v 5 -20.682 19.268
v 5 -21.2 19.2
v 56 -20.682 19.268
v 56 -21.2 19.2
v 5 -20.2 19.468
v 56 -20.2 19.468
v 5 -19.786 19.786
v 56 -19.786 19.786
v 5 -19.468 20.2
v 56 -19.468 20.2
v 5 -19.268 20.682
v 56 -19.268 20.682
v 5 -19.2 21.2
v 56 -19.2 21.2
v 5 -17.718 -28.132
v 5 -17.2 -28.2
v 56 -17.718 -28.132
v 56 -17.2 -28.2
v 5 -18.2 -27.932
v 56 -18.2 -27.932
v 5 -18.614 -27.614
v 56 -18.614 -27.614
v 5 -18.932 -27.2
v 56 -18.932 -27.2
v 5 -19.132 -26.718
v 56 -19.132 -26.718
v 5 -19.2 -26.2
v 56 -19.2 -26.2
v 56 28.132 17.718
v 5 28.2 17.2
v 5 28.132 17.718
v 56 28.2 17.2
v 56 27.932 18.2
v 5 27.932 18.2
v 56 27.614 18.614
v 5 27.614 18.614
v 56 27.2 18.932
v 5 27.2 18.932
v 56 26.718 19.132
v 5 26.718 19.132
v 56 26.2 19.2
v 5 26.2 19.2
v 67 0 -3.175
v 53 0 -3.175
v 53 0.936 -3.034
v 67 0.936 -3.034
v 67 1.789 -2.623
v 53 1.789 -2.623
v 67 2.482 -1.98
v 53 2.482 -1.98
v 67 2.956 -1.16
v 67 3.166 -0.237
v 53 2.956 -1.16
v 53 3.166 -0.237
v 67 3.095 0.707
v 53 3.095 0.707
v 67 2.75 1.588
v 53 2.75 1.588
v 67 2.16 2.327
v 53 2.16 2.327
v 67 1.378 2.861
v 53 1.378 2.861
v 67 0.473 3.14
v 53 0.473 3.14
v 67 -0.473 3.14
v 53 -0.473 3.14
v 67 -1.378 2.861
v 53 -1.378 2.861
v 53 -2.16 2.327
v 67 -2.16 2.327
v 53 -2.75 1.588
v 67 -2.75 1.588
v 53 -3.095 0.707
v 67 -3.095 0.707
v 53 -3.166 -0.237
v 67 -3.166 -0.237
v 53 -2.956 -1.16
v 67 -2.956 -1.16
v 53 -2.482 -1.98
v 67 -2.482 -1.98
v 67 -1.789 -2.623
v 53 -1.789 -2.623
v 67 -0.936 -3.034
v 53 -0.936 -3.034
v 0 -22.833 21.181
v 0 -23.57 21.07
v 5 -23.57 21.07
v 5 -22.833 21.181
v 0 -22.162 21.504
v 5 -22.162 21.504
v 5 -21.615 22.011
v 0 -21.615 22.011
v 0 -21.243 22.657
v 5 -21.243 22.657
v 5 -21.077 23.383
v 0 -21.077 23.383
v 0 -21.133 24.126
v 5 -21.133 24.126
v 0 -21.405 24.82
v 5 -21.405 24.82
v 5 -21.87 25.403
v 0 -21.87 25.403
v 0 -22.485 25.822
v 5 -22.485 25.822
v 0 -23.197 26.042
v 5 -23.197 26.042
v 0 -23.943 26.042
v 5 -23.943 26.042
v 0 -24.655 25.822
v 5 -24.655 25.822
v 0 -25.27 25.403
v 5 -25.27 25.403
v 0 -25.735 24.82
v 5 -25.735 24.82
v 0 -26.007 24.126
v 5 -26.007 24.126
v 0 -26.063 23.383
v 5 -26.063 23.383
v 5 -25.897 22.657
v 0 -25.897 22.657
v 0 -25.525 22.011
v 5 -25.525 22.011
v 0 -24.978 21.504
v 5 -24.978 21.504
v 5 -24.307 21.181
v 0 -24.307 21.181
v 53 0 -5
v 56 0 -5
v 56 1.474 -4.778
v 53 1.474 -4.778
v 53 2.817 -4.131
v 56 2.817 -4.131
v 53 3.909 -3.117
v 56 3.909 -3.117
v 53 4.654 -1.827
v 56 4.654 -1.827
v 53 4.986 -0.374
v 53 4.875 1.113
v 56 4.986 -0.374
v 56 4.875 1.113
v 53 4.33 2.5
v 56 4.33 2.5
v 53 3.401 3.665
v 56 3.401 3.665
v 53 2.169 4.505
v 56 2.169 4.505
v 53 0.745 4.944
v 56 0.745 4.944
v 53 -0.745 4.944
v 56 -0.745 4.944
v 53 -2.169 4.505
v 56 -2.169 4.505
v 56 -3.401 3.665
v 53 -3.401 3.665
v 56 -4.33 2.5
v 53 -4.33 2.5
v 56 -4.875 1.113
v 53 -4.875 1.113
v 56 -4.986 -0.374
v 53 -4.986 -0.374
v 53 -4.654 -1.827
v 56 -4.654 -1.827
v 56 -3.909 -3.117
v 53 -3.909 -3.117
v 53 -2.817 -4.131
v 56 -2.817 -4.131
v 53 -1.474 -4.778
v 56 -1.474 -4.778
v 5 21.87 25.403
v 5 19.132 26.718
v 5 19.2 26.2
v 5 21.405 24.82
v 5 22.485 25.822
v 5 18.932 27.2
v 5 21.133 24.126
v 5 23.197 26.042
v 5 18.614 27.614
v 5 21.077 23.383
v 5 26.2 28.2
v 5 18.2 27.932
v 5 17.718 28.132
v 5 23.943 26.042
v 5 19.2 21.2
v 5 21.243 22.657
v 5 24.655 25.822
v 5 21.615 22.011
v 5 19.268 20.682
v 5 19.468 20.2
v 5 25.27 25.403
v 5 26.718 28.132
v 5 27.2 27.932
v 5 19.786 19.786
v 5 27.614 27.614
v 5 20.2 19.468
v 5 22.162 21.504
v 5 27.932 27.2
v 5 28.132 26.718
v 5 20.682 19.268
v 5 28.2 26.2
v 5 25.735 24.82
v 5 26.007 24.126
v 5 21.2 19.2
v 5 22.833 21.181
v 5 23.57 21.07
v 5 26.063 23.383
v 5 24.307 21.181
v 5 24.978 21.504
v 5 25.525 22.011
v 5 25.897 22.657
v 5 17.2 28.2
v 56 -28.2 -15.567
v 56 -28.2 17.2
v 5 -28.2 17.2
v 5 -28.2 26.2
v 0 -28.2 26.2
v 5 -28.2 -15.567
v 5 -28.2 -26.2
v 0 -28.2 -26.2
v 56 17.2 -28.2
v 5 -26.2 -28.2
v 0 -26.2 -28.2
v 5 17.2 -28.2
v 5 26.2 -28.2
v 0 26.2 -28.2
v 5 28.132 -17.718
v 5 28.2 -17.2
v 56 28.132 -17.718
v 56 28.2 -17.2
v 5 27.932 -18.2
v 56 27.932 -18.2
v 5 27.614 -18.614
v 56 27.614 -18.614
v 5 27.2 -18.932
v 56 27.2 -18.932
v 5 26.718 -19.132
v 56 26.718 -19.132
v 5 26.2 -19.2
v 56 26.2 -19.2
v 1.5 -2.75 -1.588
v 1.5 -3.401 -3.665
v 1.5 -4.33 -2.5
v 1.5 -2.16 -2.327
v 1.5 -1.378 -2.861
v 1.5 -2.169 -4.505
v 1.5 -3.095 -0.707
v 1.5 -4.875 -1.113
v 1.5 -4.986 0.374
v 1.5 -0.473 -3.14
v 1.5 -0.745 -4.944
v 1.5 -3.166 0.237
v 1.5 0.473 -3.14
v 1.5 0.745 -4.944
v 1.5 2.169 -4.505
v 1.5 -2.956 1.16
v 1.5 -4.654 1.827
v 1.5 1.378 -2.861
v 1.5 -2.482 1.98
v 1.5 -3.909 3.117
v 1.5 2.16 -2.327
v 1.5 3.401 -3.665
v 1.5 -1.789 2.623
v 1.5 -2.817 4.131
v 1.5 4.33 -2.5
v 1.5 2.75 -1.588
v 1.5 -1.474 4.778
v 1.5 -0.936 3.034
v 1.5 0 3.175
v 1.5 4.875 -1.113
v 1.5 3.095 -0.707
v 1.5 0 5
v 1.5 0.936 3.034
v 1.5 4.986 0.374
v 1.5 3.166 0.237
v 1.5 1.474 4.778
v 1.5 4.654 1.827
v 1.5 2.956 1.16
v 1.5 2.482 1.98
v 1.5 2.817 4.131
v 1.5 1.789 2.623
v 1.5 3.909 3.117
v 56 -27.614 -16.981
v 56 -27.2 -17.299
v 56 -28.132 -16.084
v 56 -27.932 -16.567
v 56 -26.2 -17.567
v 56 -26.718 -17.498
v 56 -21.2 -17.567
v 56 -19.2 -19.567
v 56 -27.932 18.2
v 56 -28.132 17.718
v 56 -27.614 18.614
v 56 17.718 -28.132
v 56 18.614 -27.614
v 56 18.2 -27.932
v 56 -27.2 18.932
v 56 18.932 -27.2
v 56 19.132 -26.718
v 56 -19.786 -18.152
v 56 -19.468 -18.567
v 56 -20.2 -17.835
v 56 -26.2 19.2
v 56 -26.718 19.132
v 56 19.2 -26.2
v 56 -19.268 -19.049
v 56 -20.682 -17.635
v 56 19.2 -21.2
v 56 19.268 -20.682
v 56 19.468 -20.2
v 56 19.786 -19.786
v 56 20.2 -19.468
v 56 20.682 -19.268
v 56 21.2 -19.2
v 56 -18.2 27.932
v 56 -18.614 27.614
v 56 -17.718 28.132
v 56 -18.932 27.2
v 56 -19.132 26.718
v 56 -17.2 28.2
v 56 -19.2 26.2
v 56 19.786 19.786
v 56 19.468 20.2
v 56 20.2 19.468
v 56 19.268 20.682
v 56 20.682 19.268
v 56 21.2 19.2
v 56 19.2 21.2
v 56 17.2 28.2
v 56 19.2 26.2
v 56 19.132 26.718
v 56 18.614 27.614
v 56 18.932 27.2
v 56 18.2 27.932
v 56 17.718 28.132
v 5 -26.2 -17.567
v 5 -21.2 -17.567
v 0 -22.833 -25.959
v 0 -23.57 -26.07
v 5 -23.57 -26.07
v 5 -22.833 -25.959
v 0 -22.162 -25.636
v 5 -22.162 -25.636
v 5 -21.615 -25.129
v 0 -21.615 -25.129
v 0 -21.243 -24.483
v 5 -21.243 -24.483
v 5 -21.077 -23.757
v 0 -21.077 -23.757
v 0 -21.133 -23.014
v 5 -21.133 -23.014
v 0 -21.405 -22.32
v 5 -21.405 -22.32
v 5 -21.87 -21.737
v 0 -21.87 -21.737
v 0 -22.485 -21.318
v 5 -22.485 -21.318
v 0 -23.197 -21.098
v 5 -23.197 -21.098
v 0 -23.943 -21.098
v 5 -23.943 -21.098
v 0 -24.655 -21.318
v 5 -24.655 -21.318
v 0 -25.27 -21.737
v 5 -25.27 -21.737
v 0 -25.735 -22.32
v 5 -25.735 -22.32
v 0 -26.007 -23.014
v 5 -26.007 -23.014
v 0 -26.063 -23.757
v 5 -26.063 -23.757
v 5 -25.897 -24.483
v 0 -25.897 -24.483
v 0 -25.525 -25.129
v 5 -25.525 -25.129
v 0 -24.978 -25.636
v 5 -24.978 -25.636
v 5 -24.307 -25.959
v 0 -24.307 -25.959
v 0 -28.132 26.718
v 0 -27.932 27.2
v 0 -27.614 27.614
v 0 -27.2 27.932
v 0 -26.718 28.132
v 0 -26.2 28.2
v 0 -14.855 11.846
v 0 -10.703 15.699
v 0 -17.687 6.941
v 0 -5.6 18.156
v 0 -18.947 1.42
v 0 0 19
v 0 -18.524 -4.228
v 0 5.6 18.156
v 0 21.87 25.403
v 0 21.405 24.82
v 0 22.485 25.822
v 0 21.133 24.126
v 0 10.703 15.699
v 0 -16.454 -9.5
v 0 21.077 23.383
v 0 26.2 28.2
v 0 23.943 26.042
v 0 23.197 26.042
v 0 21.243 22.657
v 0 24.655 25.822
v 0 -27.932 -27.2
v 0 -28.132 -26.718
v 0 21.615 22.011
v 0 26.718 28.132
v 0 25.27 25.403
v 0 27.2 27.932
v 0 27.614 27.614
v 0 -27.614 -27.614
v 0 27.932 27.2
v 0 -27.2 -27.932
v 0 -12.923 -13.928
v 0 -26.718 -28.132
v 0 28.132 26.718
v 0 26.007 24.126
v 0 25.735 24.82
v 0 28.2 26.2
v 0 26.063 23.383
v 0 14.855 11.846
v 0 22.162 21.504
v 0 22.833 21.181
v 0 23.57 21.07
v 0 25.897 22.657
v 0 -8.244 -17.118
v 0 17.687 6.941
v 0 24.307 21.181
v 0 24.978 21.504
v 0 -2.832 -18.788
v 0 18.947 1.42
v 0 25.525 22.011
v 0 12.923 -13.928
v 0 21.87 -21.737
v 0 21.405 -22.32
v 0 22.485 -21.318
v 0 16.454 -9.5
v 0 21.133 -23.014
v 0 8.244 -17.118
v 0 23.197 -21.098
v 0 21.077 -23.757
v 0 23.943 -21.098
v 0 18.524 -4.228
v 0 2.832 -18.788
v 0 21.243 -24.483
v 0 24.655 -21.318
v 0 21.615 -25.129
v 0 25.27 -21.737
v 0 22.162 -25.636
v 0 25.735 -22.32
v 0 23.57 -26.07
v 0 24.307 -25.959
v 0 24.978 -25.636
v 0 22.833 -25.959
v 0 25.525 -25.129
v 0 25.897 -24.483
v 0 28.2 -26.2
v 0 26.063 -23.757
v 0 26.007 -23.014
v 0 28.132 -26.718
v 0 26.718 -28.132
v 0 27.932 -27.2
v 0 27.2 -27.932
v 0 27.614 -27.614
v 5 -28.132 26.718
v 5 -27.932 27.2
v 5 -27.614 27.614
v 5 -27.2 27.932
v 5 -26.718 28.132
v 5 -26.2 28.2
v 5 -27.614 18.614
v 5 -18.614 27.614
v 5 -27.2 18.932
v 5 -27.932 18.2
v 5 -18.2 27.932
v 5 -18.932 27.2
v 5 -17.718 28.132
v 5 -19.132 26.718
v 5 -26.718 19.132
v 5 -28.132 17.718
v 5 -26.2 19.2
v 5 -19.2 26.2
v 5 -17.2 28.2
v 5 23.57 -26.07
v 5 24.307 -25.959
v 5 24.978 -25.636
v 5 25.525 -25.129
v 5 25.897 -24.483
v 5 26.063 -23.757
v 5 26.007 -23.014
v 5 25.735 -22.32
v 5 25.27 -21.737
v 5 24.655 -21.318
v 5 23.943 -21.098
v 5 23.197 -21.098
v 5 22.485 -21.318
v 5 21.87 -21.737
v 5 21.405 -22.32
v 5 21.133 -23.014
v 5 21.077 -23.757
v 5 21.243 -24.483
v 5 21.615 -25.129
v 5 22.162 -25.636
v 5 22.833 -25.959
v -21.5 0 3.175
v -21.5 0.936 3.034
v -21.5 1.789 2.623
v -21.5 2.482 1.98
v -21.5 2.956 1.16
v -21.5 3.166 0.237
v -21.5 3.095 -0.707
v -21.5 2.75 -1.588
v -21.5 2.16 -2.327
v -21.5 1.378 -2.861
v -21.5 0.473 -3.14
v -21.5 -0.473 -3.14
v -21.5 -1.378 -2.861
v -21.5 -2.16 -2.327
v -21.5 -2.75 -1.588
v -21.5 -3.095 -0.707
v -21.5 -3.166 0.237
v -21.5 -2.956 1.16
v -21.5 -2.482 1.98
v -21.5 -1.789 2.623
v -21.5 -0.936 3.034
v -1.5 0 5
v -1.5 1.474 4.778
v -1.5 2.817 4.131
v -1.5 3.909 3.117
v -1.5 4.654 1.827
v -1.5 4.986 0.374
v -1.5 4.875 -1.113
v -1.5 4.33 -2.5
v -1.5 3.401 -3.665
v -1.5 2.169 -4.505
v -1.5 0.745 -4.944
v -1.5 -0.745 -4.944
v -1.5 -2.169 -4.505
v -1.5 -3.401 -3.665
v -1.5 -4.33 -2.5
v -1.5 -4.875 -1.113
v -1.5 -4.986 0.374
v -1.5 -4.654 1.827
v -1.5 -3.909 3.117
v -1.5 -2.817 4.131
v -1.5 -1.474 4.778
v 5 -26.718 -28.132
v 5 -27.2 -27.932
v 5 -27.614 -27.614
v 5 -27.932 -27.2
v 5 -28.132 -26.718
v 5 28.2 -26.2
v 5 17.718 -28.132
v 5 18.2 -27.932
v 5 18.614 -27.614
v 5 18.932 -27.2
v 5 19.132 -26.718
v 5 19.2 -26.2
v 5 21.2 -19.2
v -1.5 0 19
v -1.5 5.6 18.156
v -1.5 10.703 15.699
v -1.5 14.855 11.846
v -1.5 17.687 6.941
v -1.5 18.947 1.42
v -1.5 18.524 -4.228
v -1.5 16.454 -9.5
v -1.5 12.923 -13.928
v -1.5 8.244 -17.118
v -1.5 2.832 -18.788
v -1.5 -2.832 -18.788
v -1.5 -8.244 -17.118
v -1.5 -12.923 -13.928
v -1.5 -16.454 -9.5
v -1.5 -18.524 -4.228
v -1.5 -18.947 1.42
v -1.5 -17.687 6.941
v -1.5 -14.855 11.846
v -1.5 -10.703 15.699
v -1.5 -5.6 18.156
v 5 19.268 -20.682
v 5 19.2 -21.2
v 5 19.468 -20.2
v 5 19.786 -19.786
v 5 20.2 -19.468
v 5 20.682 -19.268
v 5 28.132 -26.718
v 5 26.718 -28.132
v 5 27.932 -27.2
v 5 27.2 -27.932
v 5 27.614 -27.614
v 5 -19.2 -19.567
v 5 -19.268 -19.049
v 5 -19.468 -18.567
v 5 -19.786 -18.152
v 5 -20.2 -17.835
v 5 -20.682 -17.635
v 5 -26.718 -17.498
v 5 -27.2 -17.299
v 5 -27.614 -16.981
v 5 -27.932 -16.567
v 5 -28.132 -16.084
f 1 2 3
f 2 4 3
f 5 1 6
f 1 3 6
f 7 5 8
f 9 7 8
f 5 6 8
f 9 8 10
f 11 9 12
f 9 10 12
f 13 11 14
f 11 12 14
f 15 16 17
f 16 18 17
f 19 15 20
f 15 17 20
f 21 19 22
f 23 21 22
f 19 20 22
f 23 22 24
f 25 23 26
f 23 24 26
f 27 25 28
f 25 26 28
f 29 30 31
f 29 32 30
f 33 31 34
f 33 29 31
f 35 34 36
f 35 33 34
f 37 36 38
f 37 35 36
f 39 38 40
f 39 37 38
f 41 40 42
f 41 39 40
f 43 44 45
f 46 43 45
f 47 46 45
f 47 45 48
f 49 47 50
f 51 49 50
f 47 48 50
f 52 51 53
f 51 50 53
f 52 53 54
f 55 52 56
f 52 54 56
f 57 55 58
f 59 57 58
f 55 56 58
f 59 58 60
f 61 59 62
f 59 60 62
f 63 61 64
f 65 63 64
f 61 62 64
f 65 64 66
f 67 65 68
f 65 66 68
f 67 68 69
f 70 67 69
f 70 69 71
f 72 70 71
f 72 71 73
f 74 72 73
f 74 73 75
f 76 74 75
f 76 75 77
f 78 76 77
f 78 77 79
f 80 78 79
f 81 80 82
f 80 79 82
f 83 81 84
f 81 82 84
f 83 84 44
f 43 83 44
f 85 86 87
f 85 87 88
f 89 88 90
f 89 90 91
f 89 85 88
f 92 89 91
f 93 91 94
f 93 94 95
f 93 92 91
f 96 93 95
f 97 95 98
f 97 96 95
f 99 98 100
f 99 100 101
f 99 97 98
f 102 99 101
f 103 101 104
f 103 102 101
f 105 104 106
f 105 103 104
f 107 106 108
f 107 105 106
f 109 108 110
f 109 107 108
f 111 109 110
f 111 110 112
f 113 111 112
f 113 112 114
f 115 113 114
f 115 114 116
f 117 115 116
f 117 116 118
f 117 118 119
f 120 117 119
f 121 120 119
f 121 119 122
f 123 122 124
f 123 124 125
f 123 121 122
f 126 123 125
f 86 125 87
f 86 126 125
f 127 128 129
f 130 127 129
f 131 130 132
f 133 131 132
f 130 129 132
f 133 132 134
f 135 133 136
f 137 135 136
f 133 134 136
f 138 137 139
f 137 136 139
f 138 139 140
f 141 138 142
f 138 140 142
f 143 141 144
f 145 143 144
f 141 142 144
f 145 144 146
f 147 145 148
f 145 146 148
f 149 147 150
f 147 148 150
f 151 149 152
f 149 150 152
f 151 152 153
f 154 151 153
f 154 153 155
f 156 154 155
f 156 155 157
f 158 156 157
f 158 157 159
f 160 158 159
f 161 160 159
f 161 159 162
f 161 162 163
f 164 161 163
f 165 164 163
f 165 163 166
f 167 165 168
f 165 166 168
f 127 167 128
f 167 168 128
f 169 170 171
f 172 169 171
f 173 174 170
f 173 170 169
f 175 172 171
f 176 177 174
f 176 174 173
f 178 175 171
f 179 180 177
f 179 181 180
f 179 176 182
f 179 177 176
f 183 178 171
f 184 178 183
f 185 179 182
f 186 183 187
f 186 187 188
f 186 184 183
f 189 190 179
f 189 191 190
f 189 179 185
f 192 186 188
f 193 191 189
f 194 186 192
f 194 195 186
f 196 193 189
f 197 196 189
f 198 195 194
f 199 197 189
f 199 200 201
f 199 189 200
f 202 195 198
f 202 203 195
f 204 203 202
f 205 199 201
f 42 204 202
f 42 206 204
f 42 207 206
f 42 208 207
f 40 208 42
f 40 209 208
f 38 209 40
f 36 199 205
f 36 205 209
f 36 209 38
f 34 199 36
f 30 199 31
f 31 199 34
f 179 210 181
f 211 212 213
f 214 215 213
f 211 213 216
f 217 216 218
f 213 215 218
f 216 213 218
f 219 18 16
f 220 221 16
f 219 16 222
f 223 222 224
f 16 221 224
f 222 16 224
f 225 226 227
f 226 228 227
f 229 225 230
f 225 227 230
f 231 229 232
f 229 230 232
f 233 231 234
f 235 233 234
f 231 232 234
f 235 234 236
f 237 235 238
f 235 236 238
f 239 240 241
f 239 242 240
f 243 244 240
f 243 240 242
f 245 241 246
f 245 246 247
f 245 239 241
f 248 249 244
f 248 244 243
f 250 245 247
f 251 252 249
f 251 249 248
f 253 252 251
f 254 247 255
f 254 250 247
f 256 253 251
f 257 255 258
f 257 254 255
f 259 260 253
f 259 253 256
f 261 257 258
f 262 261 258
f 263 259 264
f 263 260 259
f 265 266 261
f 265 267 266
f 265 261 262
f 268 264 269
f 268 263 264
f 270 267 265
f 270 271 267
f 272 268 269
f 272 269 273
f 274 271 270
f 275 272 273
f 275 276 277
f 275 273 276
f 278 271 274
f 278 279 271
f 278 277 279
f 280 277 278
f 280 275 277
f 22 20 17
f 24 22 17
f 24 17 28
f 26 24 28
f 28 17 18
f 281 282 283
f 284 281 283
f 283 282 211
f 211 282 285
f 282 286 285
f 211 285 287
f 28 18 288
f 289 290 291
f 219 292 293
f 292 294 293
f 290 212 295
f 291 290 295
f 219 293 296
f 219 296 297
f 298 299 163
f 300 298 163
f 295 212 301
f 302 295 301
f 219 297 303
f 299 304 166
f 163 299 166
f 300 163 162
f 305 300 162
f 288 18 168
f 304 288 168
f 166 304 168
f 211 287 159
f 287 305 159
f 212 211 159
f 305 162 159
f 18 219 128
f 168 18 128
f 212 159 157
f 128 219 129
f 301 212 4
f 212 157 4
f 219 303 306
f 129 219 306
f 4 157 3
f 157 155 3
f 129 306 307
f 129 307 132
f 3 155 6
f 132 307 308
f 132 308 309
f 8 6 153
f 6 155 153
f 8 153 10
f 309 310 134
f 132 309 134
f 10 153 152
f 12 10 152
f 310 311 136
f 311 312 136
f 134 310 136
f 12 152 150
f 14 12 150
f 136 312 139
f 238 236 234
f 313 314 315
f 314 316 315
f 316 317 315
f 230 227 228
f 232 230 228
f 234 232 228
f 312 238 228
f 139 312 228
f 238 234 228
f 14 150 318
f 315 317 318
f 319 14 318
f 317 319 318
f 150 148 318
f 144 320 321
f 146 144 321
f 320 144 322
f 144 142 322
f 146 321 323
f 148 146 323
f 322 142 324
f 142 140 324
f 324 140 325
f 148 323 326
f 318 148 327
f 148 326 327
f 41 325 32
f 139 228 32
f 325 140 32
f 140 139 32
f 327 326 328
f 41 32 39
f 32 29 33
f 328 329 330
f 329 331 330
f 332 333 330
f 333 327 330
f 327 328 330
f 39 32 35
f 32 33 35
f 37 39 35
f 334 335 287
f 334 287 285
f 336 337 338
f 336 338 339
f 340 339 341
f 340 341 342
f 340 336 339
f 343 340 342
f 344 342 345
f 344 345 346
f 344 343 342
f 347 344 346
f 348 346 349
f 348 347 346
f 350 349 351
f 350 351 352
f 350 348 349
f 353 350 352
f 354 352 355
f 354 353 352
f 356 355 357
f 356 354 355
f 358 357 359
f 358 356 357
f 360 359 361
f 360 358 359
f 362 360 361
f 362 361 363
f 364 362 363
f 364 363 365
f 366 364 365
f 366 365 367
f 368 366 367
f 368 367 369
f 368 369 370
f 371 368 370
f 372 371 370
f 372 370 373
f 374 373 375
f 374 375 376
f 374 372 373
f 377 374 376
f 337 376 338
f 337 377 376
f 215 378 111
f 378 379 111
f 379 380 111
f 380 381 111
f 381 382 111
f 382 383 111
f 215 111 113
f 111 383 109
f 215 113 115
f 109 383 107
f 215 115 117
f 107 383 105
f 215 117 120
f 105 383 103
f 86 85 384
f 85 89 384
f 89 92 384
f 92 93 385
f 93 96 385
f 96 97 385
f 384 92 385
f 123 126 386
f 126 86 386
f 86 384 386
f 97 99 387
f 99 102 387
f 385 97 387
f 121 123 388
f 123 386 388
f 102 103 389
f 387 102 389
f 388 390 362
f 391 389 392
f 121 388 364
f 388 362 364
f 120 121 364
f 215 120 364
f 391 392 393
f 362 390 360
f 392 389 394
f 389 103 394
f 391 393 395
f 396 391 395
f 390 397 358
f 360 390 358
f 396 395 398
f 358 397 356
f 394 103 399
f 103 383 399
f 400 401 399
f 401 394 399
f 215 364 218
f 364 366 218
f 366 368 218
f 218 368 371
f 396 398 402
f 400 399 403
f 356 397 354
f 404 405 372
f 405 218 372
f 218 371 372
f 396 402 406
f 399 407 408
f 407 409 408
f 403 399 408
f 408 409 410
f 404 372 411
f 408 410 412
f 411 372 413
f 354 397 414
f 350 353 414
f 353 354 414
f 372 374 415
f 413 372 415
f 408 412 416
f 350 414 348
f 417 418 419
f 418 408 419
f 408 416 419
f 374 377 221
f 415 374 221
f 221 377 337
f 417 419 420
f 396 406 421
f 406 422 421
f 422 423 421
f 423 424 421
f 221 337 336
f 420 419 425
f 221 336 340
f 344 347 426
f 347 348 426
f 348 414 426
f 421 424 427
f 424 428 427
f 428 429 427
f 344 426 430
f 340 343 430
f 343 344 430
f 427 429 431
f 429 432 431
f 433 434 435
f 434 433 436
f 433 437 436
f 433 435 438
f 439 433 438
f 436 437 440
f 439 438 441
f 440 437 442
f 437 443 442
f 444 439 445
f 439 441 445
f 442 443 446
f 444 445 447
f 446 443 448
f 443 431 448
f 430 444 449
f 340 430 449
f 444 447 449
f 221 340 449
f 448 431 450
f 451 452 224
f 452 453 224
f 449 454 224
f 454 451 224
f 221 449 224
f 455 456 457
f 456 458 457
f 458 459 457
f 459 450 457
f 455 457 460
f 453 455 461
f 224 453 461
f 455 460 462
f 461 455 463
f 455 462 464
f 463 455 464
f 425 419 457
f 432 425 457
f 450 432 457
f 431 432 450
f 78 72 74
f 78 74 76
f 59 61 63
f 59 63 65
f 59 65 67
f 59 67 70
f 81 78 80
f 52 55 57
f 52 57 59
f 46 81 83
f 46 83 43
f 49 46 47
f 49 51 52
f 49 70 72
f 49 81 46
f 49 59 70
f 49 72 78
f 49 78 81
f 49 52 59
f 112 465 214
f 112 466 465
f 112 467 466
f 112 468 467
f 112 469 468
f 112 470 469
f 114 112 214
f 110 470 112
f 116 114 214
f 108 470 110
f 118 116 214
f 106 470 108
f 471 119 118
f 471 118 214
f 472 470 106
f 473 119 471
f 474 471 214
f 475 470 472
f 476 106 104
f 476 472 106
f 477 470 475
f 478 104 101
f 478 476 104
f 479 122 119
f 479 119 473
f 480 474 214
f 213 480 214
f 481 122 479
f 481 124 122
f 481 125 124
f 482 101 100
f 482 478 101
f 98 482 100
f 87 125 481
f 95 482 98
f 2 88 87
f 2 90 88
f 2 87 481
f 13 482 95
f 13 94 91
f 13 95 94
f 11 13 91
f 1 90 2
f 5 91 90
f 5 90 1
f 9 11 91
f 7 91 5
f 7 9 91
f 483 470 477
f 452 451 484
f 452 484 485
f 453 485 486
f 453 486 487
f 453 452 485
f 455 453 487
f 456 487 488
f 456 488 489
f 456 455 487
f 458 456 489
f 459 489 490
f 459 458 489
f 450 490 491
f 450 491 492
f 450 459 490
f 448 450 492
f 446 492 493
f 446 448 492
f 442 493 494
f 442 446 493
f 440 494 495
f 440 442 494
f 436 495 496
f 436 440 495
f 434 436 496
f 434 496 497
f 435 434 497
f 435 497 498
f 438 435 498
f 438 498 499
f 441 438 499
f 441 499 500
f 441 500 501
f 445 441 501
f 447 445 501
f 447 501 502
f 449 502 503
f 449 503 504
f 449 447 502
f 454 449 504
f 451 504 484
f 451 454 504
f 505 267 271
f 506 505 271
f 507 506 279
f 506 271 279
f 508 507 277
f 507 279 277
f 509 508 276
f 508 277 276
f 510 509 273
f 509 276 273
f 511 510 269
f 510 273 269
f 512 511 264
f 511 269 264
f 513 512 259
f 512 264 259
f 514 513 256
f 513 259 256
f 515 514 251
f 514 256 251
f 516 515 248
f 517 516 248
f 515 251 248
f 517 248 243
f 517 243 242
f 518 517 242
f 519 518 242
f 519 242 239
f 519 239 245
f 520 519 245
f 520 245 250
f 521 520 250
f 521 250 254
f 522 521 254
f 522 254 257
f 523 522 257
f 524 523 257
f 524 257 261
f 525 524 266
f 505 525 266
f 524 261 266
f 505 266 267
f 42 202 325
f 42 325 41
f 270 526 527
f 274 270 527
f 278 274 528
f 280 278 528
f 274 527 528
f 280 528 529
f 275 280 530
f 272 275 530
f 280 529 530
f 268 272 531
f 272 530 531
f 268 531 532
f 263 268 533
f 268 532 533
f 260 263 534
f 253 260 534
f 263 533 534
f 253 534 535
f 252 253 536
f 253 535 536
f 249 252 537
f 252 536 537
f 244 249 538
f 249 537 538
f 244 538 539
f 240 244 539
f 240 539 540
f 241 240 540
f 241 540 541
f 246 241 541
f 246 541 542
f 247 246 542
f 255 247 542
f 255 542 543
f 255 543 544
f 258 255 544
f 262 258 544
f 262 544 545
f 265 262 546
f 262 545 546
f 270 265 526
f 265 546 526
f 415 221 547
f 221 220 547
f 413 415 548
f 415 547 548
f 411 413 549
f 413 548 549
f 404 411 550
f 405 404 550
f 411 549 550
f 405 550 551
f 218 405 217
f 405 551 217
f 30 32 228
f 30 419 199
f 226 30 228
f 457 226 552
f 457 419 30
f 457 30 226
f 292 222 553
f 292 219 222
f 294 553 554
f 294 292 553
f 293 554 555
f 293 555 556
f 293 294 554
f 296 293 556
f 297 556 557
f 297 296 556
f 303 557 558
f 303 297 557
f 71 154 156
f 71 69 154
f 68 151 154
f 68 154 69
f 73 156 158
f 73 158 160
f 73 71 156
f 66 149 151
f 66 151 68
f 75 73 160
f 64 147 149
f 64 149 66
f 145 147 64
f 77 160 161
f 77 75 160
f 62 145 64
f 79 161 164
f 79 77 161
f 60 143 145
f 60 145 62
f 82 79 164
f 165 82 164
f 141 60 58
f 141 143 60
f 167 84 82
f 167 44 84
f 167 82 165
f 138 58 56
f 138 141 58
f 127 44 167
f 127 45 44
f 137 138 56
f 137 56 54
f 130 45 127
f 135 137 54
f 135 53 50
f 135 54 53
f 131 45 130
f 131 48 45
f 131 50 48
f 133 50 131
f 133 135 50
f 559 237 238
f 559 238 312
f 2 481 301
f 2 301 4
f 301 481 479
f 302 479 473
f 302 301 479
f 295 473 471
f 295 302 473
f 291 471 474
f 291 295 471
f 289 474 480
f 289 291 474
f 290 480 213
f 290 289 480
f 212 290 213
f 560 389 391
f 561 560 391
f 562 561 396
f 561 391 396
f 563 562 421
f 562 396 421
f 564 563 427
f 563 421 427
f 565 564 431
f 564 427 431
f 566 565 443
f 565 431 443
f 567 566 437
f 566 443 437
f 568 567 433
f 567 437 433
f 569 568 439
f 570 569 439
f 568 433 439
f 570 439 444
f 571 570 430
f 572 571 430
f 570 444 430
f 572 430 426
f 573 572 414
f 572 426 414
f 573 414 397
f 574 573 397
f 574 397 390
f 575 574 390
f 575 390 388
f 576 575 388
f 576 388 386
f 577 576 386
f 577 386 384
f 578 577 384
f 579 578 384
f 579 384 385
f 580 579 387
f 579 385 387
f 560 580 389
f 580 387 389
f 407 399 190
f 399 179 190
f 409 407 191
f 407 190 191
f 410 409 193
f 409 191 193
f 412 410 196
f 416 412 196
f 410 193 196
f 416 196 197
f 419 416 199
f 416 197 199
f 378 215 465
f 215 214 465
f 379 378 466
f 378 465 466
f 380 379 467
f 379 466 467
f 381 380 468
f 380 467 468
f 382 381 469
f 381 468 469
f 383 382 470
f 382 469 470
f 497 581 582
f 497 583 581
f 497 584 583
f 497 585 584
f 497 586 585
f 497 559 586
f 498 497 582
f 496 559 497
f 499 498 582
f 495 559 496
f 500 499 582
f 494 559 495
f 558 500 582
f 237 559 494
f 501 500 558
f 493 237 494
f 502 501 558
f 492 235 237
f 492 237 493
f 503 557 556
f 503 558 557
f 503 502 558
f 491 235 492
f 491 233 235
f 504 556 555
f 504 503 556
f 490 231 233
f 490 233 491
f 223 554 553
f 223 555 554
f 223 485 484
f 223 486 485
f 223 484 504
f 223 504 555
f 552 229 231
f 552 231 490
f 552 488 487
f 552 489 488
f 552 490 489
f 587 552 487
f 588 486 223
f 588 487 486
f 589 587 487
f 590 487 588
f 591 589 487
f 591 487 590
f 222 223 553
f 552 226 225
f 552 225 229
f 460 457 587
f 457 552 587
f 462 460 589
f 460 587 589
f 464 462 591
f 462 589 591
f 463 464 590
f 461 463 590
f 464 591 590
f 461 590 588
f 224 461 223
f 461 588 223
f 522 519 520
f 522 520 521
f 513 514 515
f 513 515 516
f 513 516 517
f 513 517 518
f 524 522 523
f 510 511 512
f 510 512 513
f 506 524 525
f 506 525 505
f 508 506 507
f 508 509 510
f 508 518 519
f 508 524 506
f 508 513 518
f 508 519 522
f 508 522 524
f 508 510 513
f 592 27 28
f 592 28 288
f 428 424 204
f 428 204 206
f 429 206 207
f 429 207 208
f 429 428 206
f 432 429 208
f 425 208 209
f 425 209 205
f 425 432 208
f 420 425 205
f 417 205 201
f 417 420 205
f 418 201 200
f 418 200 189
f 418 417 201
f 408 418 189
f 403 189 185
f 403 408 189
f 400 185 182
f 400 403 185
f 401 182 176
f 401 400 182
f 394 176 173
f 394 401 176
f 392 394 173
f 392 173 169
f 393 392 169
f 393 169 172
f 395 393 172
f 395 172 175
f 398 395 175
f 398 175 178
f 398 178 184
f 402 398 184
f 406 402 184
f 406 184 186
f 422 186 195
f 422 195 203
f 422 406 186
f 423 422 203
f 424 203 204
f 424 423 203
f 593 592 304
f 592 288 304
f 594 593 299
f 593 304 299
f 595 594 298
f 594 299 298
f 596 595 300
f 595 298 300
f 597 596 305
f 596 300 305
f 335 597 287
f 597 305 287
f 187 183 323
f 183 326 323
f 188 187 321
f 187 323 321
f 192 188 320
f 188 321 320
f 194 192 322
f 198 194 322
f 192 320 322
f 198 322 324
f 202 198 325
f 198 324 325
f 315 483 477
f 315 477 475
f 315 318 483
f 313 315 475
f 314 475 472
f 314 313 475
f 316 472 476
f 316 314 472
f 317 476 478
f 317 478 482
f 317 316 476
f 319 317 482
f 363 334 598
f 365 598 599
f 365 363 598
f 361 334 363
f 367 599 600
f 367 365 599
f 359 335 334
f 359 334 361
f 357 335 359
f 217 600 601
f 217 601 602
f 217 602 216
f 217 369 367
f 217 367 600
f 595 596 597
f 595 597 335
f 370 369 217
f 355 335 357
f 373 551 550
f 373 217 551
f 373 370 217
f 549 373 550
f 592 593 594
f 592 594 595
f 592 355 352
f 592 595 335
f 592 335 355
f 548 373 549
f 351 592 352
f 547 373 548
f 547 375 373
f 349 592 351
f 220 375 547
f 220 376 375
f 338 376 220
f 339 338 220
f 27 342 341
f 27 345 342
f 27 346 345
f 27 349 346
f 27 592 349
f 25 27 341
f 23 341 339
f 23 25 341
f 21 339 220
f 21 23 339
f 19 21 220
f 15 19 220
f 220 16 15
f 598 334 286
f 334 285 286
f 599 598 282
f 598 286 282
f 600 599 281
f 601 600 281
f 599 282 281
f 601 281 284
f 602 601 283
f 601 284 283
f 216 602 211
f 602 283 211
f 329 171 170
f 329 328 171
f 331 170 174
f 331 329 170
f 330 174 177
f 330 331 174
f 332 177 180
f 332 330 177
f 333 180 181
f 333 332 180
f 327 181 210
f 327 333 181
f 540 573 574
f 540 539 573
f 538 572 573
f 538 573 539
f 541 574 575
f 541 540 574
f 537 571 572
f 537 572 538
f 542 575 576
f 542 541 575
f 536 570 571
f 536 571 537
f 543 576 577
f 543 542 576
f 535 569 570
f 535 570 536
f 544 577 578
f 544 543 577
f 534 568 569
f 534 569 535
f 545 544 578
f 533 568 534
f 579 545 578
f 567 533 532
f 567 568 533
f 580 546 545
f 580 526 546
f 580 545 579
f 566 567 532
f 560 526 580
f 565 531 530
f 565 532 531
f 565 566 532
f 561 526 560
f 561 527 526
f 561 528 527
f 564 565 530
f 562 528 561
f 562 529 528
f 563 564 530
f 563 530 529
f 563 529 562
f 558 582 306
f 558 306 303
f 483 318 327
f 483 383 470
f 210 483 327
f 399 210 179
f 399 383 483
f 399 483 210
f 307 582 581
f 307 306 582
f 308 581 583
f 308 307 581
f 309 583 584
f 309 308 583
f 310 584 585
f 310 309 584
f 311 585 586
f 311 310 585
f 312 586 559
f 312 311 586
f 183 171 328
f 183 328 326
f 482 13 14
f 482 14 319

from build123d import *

# Parameters (mm, degrees)
SKETCH1_W           = 56.4
SKETCH1_H           = 56.4
SKETCH1_R           = 2.5
BOSS_EXTRUDE1_DEPTH = 5
BOSS_EXTRUDE2_DEPTH = 51
SKETCH3_R           = 5
CUT_EXTRUDE1_DEPTH  = 3
SKETCH5_R           = 3.175
BOSS_EXTRUDE3_DEPTH = 14
SKETCH6_R           = 19
BOSS_EXTRUDE4_DEPTH = 1.5
SKETCH7_R           = 5
CUT_EXTRUDE2_DEPTH  = 3
SKETCH9_R           = 3.175
BOSS_EXTRUDE5_DEPTH = 23
FILLET1_R           = 2
FILLET2_R           = 2
FILLET3_R           = 2
FILLET4_R           = 2
FILLET5_R           = 2
FILLET6_R           = 2
FILLET7_R           = 2
FILLET8_R           = 2
FILLET9_R           = 2
FILLET10_R          = 2
FILLET11_R          = 2
FILLET12_R          = 2
FILLET13_R          = 2
FILLET14_R          = 2
FILLET15_R          = 2
FILLET16_R          = 2


with BuildPart() as part:
    # Sketch1 → Boss-Extrude1 (new body)
    with BuildSketch(Plane(origin=(0, 0, 0), x_dir=(0, 0, -1), z_dir=(1, 0, 0))):
        Rectangle(SKETCH1_W, SKETCH1_H)
        with Locations((-23.57, 23.57)):
            Circle(SKETCH1_R, mode=Mode.SUBTRACT)
        with Locations((23.57, 23.57)):
            Circle(SKETCH1_R, mode=Mode.SUBTRACT)
        with Locations((23.57, -23.57)):
            Circle(SKETCH1_R, mode=Mode.SUBTRACT)
        with Locations((-23.57, -23.57)):
            Circle(SKETCH1_R, mode=Mode.SUBTRACT)
    extrude(amount=BOSS_EXTRUDE1_DEPTH)

    # Sketch2 → Boss-Extrude2 (add)
    with BuildSketch(Plane(origin=(5, 0, 0), x_dir=(0, 0, -1), z_dir=(1, 0, 0))):
        Polygon((-28.2, 19.2), (-19.2, 19.2), (-19.2, 28.2), (19.2, 28.2), (19.2, 19.2), (28.2, 19.2), (28.2, -19.2), (17.566571472, -19.2), (17.566571472, -28.2), (-19.2, -28.2), (-19.2, -19.2), (-28.2, -19.2), align=None)
    extrude(amount=BOSS_EXTRUDE2_DEPTH)

    # Sketch3 → Cut-Extrude1 (cut)
    with BuildSketch(Plane(origin=(56, 0, 0), x_dir=(0, 0, -1), z_dir=(1, 0, 0))):
        Circle(SKETCH3_R)
    extrude(amount=-CUT_EXTRUDE1_DEPTH, mode=Mode.SUBTRACT)

    # Sketch5 → Boss-Extrude3 (add)
    with BuildSketch(Plane(origin=(53, 0, 0), x_dir=(0, 0, -1), z_dir=(1, 0, 0))):
        Circle(SKETCH5_R)
    extrude(amount=BOSS_EXTRUDE3_DEPTH)

    # Sketch6 → Boss-Extrude4 (add)
    with BuildSketch(Plane.ZY):
        Circle(SKETCH6_R)
    extrude(amount=BOSS_EXTRUDE4_DEPTH)

    # Sketch7 → Cut-Extrude2 (cut)
    with BuildSketch(Plane.ZY.offset(1.5)):
        Circle(SKETCH7_R)
    extrude(amount=-CUT_EXTRUDE2_DEPTH, mode=Mode.SUBTRACT)

    # Sketch9 → Boss-Extrude5 (add)
    with BuildSketch(Plane.ZY.offset(-1.5)):
        Circle(SKETCH9_R)
    extrude(amount=BOSS_EXTRUDE5_DEPTH)

    # Fillet1
    fillet1_edges = [part.edges().sort_by_distance(p)[0] for p in [
        (2.5, 28.2, 28.2),
    ]]
    fillet(fillet1_edges, radius=FILLET1_R)

    # Fillet2
    fillet2_edges = [part.edges().sort_by_distance(p)[0] for p in [
        (2.5, 28.2, -28.2),
    ]]
    fillet(fillet2_edges, radius=FILLET2_R)

    # Fillet3
    fillet3_edges = [part.edges().sort_by_distance(p)[0] for p in [
        (2.5, -28.2, -28.2),
    ]]
    fillet(fillet3_edges, radius=FILLET3_R)

    # Fillet4
    fillet4_edges = [part.edges().sort_by_distance(p)[0] for p in [
        (2.5, -28.2, 28.2),
    ]]
    fillet(fillet4_edges, radius=FILLET4_R)

    # Fillet5
    fillet5_edges = [part.edges().sort_by_distance(p)[0] for p in [
        (30.5, 28.2, -19.2),
    ]]
    fillet(fillet5_edges, radius=FILLET5_R)

    # Fillet6
    fillet6_edges = [part.edges().sort_by_distance(p)[0] for p in [
        (30.5, 19.2, -28.2),
    ]]
    fillet(fillet6_edges, radius=FILLET6_R)

    # Fillet7
    fillet7_edges = [part.edges().sort_by_distance(p)[0] for p in [
        (30.5, -19.2, -28.2),
    ]]
    fillet(fillet7_edges, radius=FILLET7_R)

    # Fillet8
    fillet8_edges = [part.edges().sort_by_distance(p)[0] for p in [
        (30.5, -28.2, -17.566571472),
    ]]
    fillet(fillet8_edges, radius=FILLET8_R)

    # Fillet9
    fillet9_edges = [part.edges().sort_by_distance(p)[0] for p in [
        (30.5, -28.2, 19.2),
    ]]
    fillet(fillet9_edges, radius=FILLET9_R)

    # Fillet10
    fillet10_edges = [part.edges().sort_by_distance(p)[0] for p in [
        (30.5, -19.2, 28.2),
    ]]
    fillet(fillet10_edges, radius=FILLET10_R)

    # Fillet11
    fillet11_edges = [part.edges().sort_by_distance(p)[0] for p in [
        (30.5, 19.2, 28.2),
    ]]
    fillet(fillet11_edges, radius=FILLET11_R)

    # Fillet12
    fillet12_edges = [part.edges().sort_by_distance(p)[0] for p in [
        (30.5, 28.2, 19.2),
    ]]
    fillet(fillet12_edges, radius=FILLET12_R)

    # Fillet13
    fillet13_edges = [part.edges().sort_by_distance(p)[0] for p in [
        (30.5, 19.2, -19.2),
    ]]
    fillet(fillet13_edges, radius=FILLET13_R)

    # Fillet14
    fillet14_edges = [part.edges().sort_by_distance(p)[0] for p in [
        (30.5, -19.2, -17.566571472),
    ]]
    fillet(fillet14_edges, radius=FILLET14_R)

    # Fillet15
    fillet15_edges = [part.edges().sort_by_distance(p)[0] for p in [
        (30.5, -19.2, 19.2),
    ]]
    fillet(fillet15_edges, radius=FILLET15_R)

    # Fillet16
    fillet16_edges = [part.edges().sort_by_distance(p)[0] for p in [
        (30.5, 19.2, 19.2),
    ]]
    fillet(fillet16_edges, radius=FILLET16_R)


solid = part.part
